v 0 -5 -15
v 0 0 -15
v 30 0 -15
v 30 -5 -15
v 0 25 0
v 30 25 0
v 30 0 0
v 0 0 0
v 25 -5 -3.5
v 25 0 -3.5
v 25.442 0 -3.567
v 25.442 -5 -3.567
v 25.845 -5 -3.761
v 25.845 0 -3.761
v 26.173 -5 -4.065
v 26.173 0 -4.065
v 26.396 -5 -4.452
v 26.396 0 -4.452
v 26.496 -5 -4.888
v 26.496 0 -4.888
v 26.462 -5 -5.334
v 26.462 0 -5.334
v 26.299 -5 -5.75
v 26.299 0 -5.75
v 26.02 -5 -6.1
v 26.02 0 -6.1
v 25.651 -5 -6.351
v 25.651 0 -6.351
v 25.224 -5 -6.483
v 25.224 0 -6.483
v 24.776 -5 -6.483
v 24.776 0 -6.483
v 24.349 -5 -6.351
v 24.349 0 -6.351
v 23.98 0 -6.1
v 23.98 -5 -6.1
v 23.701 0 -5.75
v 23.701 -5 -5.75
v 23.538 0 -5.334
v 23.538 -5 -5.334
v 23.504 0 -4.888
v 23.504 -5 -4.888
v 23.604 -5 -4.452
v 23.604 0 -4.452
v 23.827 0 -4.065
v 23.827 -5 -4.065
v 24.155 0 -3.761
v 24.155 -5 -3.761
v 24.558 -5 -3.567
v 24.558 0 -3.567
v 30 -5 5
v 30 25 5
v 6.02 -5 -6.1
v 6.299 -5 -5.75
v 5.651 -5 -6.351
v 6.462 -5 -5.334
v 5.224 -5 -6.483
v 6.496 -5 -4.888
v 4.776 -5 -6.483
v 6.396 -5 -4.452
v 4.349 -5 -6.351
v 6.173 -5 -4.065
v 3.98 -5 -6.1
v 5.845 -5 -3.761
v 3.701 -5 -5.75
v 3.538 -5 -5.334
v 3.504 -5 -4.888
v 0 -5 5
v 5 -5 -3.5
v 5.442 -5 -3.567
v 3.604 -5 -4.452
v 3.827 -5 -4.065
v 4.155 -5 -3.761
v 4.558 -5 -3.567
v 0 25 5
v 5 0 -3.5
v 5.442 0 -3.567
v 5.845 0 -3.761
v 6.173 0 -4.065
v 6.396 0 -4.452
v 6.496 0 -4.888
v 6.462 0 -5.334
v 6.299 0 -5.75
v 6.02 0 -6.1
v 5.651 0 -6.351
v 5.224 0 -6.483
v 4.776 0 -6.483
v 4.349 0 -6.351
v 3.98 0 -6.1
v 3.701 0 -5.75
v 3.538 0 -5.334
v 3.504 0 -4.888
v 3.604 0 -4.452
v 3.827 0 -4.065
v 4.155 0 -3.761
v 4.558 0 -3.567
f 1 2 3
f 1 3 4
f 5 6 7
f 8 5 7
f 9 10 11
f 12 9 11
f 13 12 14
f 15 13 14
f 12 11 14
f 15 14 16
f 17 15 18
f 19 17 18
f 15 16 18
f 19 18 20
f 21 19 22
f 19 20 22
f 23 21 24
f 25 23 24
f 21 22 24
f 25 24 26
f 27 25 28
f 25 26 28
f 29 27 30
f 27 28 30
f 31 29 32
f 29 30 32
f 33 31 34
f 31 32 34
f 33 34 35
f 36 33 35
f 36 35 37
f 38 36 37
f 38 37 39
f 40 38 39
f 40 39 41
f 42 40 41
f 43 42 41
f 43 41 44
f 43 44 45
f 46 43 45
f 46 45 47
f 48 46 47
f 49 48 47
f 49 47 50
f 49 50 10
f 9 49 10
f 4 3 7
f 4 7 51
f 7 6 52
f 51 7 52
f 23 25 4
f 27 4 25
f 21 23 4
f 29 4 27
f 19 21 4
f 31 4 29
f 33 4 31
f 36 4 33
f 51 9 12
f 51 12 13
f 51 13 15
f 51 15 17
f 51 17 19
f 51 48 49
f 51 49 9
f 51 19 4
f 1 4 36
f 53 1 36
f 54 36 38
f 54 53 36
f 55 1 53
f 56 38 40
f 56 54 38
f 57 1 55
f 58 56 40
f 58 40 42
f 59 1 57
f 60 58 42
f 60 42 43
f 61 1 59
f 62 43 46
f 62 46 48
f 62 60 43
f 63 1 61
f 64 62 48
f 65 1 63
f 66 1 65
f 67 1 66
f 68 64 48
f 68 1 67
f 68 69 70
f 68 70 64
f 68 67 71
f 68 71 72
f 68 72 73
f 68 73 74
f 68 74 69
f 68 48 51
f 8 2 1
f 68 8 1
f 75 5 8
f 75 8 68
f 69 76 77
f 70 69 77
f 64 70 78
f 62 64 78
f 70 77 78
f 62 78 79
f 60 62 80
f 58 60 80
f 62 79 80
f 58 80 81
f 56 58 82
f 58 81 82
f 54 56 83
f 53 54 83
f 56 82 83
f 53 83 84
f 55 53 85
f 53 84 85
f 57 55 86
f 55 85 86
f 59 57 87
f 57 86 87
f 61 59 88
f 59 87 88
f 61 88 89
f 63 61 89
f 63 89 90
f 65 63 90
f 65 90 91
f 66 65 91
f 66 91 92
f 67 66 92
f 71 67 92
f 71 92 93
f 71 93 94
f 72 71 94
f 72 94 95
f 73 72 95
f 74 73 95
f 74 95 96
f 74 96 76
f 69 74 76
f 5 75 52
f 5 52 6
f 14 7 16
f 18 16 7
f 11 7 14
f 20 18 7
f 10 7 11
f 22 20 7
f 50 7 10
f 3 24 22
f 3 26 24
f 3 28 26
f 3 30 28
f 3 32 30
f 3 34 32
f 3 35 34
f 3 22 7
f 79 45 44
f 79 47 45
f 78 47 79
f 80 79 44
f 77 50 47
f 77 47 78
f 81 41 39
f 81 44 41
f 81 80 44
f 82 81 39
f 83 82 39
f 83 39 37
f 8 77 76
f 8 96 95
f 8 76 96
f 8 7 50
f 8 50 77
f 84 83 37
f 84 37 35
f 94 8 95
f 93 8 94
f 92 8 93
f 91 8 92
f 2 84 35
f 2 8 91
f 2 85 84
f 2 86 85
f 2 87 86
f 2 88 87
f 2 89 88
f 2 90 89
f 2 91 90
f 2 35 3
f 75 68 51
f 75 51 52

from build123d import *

# Parameters (mm, degrees)
EXTRUDE_1_DEPTH     = 30
SKETCH_2_R          = 1.5
CUT_EXTRUDE_1_DEPTH = 20


with BuildPart() as part:
    # 草图1 → 凸台-拉伸1 (new body)
    with BuildSketch(Plane(origin=(0, 0, 0), x_dir=(0, 0, -1), z_dir=(1, 0, 0))):
        Polygon((0, 25), (0, 0), (15, 0), (15, -5), (-5, -5), (-5, 25), align=None)
    extrude(amount=EXTRUDE_1_DEPTH)

    # 草图2 → 切除-拉伸1 (cut)
    with BuildSketch(Plane(origin=(0, 0, 0), x_dir=(1, 0, 0), z_dir=(0, 1, 0))):
        with Locations(Location((5, 5, 0), (0, 0, 270))):
            Circle(SKETCH_2_R)
        with Locations(Location((25, 5, 0), (0, 0, 270))):
            Circle(SKETCH_2_R)
    extrude(amount=-CUT_EXTRUDE_1_DEPTH, mode=Mode.SUBTRACT)


solid = part.part
